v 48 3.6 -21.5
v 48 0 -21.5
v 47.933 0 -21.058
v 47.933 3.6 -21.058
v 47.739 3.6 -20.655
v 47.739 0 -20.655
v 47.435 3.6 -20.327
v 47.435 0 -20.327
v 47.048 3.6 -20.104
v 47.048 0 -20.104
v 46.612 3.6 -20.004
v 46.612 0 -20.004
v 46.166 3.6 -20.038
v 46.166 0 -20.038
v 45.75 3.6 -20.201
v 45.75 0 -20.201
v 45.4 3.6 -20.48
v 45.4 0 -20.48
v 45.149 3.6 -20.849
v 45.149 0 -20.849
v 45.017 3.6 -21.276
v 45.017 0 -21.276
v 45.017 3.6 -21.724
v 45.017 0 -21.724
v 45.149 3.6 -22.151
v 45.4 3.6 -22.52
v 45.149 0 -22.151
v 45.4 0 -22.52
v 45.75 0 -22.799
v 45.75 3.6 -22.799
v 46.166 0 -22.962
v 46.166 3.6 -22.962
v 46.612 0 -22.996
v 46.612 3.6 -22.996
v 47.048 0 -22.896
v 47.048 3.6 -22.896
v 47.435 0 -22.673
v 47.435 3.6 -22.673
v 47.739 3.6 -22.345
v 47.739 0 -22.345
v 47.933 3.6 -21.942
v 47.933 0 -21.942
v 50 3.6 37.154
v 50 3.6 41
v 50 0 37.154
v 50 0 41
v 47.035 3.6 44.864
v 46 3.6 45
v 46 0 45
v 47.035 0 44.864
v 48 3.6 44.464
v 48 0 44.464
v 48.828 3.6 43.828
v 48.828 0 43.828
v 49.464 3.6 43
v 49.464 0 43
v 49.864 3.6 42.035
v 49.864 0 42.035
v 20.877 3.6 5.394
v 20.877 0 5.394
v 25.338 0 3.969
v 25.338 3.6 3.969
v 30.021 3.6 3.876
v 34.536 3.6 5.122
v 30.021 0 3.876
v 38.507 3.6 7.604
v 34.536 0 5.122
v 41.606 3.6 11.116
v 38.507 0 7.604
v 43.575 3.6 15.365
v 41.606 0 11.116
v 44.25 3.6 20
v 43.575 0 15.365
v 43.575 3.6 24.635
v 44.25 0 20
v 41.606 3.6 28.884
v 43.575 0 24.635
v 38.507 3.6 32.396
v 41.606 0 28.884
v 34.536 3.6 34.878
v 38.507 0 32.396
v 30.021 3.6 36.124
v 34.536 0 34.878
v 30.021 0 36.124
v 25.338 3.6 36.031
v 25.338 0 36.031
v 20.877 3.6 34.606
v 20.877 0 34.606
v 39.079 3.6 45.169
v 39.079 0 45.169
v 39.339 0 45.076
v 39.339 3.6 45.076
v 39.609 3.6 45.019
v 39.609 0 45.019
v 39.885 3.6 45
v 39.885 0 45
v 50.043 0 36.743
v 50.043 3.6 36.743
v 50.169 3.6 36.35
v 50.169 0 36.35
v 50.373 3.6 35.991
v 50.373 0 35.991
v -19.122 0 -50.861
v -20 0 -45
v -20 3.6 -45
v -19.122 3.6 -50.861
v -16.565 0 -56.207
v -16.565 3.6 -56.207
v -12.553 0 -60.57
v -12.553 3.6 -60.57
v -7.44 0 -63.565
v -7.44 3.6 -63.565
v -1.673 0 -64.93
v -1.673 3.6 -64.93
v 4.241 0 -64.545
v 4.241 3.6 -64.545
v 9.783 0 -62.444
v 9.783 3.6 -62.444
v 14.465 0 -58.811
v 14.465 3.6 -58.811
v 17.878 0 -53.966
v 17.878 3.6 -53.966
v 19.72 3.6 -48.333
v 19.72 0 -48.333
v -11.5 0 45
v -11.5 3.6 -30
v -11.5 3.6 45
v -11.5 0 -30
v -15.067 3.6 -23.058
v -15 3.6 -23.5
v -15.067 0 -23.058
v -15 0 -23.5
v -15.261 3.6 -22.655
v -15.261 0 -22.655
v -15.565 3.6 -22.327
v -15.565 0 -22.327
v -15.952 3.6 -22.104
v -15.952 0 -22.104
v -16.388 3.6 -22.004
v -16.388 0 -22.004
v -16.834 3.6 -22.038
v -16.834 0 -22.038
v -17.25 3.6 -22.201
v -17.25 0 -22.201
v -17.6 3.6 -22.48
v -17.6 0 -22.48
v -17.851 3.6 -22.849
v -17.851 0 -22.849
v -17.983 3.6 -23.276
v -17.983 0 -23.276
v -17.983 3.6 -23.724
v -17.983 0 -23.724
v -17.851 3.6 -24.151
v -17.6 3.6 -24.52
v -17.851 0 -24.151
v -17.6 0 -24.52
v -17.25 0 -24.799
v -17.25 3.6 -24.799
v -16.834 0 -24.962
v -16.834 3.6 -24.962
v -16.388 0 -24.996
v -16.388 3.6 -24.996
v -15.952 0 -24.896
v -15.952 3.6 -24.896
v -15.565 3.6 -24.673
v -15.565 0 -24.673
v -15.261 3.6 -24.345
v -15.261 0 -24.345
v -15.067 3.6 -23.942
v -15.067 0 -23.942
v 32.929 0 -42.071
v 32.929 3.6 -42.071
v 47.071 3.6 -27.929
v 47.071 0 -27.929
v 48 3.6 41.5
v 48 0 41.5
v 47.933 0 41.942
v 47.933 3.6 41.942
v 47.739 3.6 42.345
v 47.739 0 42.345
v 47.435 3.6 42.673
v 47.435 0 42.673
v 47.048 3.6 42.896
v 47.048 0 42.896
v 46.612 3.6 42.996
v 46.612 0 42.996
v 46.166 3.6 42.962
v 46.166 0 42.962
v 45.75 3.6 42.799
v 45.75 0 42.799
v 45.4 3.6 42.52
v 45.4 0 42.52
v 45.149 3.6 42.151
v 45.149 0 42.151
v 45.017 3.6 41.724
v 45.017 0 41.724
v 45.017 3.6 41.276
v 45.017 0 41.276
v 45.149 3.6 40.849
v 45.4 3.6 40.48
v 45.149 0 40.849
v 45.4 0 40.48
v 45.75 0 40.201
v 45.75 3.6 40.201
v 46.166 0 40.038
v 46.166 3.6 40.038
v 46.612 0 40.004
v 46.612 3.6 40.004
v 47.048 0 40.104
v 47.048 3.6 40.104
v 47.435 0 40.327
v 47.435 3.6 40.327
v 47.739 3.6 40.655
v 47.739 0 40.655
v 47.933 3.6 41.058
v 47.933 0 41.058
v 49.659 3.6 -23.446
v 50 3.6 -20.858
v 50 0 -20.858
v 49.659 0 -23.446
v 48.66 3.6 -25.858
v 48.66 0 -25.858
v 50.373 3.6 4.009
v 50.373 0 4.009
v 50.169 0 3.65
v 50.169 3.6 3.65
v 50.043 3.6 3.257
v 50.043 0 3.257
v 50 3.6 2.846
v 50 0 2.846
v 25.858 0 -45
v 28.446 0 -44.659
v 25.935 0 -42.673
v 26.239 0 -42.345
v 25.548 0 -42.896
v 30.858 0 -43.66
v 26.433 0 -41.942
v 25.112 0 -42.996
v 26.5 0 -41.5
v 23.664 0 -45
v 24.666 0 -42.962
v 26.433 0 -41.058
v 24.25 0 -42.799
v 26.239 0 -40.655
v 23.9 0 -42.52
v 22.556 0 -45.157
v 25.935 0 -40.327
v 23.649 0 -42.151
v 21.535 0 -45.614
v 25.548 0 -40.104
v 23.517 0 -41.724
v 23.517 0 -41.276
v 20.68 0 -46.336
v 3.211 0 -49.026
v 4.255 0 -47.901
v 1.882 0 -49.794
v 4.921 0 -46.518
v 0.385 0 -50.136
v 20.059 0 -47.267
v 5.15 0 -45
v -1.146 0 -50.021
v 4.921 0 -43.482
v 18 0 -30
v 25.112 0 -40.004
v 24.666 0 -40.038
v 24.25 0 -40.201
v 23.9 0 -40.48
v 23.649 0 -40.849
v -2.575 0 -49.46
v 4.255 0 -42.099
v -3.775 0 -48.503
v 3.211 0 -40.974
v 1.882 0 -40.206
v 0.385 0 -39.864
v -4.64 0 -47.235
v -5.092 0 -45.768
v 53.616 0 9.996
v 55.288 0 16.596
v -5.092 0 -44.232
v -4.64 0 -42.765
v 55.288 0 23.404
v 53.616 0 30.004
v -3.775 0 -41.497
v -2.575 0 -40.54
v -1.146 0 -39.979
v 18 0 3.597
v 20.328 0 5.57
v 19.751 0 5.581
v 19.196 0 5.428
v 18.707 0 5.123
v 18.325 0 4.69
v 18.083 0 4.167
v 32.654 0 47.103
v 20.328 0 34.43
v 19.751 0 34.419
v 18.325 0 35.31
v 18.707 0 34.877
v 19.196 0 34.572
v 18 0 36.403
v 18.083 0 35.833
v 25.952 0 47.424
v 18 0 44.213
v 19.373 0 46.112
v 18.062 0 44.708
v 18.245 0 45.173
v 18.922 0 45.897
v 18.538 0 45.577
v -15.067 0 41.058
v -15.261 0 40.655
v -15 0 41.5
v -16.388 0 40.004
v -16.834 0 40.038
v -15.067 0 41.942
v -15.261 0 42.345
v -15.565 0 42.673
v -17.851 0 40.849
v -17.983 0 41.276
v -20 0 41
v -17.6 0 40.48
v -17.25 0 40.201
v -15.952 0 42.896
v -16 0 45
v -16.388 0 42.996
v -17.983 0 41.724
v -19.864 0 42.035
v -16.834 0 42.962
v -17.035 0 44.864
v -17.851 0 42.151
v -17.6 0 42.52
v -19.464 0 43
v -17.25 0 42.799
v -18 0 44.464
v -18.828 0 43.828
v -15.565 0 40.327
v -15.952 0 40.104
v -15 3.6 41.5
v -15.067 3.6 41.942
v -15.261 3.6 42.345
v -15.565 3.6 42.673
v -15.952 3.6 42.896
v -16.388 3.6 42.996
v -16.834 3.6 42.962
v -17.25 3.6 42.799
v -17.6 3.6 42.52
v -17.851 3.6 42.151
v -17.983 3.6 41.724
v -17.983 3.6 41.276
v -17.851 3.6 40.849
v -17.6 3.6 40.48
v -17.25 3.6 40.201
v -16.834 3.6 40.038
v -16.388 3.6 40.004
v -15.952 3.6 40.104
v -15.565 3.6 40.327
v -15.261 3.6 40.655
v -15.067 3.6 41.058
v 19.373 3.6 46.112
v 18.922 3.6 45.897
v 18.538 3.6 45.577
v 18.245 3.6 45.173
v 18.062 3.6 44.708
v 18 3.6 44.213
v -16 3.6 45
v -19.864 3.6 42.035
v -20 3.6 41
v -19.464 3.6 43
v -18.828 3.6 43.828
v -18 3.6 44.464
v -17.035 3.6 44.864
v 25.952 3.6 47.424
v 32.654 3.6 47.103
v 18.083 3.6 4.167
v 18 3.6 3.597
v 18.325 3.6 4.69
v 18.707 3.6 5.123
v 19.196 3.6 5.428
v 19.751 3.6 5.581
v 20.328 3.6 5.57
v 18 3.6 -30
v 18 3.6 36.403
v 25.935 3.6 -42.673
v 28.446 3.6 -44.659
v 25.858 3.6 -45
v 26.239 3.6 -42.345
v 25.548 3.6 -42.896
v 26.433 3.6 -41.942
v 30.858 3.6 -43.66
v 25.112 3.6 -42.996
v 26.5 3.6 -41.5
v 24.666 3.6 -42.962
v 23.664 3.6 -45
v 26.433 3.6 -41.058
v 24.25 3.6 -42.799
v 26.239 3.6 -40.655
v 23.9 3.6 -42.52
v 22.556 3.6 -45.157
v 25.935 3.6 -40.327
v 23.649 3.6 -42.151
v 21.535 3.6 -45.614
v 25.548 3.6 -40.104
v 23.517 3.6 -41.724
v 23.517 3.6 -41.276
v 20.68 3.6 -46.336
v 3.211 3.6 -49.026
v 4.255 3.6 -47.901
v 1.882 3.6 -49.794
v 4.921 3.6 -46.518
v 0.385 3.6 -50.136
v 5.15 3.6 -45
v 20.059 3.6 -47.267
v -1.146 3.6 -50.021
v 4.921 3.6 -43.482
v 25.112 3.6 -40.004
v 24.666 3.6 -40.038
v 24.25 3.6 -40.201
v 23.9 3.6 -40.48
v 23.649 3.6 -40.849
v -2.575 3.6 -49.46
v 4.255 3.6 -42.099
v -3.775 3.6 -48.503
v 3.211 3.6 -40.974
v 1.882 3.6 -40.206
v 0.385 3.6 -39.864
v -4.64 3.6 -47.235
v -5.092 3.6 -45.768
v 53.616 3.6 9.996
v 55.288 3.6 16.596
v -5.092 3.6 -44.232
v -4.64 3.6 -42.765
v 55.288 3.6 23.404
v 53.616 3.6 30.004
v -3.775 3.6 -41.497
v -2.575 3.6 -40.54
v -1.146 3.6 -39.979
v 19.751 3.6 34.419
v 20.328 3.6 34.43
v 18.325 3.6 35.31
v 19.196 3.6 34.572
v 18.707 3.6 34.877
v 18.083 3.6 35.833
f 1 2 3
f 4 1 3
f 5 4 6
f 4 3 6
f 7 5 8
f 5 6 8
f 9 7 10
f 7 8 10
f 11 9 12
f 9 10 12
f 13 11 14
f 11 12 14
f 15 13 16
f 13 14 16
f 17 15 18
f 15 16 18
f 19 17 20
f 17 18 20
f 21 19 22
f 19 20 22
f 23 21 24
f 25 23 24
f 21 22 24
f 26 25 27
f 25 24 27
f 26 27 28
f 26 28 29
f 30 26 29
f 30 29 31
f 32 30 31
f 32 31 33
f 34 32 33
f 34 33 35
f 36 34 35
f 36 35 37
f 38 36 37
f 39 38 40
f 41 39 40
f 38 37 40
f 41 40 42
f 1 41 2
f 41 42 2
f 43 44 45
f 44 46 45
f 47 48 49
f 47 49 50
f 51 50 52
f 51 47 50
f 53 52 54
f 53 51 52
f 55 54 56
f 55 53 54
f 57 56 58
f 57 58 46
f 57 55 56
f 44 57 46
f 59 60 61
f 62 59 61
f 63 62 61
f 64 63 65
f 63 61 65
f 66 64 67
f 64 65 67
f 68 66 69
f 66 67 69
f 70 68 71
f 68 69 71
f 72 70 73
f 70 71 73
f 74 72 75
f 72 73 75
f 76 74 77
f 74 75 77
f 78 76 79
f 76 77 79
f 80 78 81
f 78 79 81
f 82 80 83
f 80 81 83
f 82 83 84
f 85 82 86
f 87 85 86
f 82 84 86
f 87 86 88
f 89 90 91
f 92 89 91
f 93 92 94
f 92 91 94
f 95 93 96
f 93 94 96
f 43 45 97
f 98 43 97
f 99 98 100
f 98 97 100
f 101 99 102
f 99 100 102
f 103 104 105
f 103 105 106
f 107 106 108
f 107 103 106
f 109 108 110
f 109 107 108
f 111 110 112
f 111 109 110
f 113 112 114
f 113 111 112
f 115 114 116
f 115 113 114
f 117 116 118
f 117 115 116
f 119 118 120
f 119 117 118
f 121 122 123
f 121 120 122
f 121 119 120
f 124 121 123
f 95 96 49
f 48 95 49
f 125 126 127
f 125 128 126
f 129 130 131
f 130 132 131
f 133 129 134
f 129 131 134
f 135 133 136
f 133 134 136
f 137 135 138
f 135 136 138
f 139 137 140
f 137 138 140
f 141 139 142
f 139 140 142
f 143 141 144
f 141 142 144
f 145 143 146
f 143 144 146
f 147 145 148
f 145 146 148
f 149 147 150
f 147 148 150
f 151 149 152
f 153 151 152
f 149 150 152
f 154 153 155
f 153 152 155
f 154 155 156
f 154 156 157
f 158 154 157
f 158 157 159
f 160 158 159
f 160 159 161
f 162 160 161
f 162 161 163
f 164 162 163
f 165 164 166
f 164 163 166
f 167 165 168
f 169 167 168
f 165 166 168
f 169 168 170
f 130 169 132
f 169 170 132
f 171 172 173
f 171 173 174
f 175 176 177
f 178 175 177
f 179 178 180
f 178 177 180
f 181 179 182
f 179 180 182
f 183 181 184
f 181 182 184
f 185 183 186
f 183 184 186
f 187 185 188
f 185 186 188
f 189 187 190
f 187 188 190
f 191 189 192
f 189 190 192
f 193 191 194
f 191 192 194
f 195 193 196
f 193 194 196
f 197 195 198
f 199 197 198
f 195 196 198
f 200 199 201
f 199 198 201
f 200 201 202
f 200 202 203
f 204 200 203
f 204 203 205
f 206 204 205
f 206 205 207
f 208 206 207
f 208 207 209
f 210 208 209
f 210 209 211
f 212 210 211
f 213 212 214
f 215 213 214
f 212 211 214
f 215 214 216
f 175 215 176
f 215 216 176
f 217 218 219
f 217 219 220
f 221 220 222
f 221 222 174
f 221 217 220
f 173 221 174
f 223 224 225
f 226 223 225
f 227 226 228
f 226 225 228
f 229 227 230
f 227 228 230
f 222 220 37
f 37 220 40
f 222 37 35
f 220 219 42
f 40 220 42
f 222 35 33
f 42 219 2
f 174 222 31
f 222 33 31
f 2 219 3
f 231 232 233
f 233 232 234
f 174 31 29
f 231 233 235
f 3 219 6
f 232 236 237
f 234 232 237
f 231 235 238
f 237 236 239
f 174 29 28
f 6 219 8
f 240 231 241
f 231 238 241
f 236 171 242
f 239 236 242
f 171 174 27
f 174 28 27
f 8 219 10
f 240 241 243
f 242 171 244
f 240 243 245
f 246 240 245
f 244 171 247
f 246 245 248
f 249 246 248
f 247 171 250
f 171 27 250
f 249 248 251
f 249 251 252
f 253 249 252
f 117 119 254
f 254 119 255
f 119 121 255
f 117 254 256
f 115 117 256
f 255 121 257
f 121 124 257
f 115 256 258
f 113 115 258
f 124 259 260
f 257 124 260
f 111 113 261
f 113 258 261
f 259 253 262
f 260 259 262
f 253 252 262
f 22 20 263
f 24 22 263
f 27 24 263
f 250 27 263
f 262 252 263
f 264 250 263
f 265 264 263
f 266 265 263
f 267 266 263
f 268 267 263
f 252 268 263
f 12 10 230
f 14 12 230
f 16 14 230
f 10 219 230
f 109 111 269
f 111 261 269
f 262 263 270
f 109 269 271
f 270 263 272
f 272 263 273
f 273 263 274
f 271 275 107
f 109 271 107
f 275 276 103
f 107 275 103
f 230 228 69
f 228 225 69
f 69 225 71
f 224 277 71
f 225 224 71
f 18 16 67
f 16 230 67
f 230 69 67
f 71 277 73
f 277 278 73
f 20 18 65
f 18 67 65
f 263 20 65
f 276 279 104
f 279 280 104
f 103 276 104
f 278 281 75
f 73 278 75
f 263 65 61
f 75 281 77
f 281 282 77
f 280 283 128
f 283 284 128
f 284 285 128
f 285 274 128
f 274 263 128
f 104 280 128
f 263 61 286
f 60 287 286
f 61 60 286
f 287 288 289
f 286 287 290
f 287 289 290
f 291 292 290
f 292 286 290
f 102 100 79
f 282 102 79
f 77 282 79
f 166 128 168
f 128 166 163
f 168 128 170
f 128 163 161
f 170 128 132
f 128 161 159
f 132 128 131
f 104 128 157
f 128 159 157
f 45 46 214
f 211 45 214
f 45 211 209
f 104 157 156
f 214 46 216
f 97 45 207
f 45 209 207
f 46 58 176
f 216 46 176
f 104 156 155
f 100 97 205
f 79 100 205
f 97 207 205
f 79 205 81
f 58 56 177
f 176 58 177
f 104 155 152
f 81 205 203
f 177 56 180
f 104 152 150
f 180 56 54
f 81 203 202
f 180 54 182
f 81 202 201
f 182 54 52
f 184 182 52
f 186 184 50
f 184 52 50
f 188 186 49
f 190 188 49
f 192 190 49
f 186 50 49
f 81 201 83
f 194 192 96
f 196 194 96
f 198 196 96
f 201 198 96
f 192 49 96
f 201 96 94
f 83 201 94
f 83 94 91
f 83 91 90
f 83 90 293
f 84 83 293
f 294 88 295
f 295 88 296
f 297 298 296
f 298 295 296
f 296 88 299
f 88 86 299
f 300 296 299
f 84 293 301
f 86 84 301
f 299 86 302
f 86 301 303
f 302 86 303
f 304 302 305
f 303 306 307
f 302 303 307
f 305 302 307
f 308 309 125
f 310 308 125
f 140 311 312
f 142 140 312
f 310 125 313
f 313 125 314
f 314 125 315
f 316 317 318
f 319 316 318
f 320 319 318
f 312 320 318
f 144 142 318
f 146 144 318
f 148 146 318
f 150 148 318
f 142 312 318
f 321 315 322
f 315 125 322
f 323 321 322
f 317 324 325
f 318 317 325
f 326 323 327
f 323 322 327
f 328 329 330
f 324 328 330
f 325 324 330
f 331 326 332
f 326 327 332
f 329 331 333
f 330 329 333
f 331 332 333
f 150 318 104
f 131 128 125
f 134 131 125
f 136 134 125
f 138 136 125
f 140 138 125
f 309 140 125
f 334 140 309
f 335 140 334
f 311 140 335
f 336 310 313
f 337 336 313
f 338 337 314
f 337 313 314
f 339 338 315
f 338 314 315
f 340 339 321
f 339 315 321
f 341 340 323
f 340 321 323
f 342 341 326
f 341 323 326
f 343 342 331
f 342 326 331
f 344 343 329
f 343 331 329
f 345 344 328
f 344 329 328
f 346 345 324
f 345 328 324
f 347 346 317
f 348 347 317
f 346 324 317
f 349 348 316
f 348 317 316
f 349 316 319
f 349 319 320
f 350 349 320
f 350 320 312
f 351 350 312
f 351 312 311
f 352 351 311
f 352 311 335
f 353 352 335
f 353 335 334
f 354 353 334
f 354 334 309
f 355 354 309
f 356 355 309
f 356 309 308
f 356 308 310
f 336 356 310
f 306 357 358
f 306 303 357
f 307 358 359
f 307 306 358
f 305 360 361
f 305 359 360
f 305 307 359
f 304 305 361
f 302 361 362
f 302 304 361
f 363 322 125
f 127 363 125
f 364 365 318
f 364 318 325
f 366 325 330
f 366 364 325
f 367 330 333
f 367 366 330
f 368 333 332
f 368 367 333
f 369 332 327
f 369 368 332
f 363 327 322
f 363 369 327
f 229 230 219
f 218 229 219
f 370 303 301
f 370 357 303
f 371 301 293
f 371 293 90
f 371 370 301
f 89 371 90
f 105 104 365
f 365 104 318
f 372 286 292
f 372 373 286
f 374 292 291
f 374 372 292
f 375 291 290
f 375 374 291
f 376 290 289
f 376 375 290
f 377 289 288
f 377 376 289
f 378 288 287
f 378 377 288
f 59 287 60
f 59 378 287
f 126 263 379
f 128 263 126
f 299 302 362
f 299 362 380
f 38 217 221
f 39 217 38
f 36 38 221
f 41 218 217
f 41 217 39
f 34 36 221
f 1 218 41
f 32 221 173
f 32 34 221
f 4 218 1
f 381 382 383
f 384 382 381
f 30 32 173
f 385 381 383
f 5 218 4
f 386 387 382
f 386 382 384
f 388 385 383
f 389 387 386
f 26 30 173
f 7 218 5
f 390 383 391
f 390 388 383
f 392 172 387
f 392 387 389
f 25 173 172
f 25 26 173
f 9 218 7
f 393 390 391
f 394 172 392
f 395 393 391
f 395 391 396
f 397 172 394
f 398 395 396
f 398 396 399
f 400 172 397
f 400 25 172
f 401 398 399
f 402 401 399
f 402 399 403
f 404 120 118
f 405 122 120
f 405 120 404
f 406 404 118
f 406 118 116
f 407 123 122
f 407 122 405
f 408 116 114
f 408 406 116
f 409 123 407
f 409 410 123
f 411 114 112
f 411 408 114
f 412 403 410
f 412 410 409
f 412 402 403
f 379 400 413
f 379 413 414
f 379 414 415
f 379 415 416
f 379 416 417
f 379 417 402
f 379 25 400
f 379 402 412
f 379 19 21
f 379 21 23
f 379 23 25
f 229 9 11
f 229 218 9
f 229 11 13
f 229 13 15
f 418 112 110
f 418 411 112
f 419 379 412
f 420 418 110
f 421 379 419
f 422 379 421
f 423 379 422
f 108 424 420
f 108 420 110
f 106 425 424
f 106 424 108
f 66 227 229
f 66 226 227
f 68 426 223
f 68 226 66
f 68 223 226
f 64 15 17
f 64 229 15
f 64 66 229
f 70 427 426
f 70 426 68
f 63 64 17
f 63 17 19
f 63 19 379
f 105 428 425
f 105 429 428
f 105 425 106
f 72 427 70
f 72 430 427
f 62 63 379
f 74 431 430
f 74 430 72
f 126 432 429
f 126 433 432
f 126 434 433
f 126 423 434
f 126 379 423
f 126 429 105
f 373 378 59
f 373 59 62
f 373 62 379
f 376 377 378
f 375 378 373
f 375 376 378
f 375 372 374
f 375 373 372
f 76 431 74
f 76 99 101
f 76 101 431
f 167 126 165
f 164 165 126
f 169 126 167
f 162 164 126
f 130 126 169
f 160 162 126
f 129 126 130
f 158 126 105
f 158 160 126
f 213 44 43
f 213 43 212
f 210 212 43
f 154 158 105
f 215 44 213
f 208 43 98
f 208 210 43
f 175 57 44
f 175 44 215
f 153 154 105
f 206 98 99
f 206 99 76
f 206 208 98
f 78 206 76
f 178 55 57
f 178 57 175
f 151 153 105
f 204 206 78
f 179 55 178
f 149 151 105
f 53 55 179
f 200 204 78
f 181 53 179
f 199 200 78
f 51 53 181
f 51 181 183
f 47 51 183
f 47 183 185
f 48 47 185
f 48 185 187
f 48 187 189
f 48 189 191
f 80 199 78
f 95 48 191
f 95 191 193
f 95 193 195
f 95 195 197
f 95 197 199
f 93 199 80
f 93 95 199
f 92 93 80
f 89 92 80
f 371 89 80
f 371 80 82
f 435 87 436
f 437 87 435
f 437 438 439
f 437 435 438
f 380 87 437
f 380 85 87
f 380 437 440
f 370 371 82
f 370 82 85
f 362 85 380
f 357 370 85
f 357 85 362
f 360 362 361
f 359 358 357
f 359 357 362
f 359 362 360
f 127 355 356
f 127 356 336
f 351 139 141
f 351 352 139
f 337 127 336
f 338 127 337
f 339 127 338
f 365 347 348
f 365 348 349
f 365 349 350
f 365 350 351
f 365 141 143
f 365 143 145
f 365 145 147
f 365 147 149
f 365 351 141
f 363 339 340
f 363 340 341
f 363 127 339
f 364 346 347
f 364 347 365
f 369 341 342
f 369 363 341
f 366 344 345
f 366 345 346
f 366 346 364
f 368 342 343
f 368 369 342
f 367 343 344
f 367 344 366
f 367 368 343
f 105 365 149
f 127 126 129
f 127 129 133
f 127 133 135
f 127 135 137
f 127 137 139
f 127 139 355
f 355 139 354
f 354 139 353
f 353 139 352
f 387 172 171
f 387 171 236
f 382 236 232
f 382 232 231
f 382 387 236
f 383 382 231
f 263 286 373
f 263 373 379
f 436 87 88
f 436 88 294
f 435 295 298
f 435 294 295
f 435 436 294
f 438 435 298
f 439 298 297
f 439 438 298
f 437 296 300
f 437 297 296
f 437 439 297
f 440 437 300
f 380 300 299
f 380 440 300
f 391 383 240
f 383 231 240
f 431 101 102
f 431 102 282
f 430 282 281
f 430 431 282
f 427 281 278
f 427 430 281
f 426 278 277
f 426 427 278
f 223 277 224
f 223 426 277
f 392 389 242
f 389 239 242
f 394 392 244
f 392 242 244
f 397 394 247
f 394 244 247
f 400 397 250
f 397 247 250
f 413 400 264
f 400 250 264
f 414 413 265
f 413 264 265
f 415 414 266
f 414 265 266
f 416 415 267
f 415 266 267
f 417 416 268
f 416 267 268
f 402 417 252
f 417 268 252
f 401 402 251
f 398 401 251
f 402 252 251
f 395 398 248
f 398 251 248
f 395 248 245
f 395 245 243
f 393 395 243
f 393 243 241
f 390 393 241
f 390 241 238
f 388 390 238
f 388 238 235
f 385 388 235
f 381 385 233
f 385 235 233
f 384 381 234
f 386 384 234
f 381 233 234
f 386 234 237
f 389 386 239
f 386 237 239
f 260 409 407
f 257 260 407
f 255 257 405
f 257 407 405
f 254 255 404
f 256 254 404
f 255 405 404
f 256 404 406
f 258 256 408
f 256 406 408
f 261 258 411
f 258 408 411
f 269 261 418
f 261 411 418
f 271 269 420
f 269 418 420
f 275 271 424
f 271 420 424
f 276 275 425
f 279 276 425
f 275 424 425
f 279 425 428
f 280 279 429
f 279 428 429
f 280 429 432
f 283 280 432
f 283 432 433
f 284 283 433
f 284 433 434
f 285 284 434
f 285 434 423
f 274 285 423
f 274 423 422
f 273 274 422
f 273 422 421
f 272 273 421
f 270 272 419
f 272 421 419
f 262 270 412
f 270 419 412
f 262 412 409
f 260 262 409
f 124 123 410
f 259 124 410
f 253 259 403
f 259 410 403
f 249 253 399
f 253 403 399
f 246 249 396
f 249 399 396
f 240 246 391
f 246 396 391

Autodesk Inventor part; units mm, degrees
ref_plane "YZ Plane" through (0, 0, 0) normal (1, 0, 0) x (0, 1, 0)
ref_plane "XZ Plane" through (0, 0, 0) normal (0, 1, 0) x (-1, 0, 0)
ref_plane "XY Plane" through (0, 0, 0) normal (0, 0, 1) x (1, 0, 0)
sketch "Sketch1" plane through (0, 0, 0) normal (0, 1, 0) x (-1, 0, 0)
  line L0 (20, 45) -> (-20, 45)
  line L1 (-20, 45) -> (-20, -45)
  line L2 (-20, -45) -> (20, -45)
  line L3 (20, -45) -> (20, 45)
  line L4 (20, 45) -> (-20, -45) construction
  line L5 (-20, 45) -> (20, -45) construction
  arc A0 (-20, -45) -> (20, -45) centre (0, -45) ccw
  line L6 (20, -45) -> (20, -45)
  line L7 (20, -45) -> (20, 45)
  line L8 (20, 45) -> (20, 45)
  line L9 (20, 45) -> (20, -45)
  line L10 (-20, 45) -> (-50, 45)
  line L11 (-50, 45) -> (-50, -45)
  line L12 (-50, -45) -> (-20, -45)
  line L13 (-20, -45) -> (-20, 45)
  point P0 (0, 0)
  dimension "d0" = 40
  dimension "d1" = 90
  dimension "d7" = 0
  dimension "d8" = 90
  dimension "d35" = 30
extrude "Extrusion1" add sketch "Sketch1" along normal blind 3.6
sketch "Sketch2" plane through (0, 3.6, 0) normal (0, 1, 0) x (1, 0, 0)
  arc A0 (20, 45) -> (-20, 45) centre (0, 45) ccw projected
  circle A1 centre (0, 45) radius 5.15
  point P0 (0, 0)
  dimension "d4" = 10.3
extrude "Extrusion2" cut sketch "Sketch2" against normal blind 3.6
sketch "Sketch3" plane through (0, 0, 0) normal (0, -1, 0) x (1, 0, 0)
  line L0 (-20, 45) -> (50, 45) projected
  line L1 (-11.5, 45) -> (18, 45)
  line L2 (18, 45) -> (18, -30)
  line L3 (18, -30) -> (-11.5, -30)
  line L4 (-11.5, -30) -> (-11.5, 45)
  circle A0 centre (28, 20) radius 16.25
  line L5 (-20, -45) -> (-20, 45) projected
  line L6 (50, 45) -> (50, -45) projected
  point P0 (0, 0)
  point P1 (16, 45)
  dimension "d10" = 29.5
  dimension "d11" = 75
  dimension "d13" = 32.5
  dimension "d15" = 25
  dimension "d37" = 32
  dimension "d39" = 22
extrude "Extrusion3" cut sketch "Sketch3" against normal blind 10
fillet "Fillet2" radius 2 3 edges at (18, 1.8, 45) (18, 1.8, 32.8087) (18, 1.8, 7.1913)
fillet "Fillet3" radius 4 4 edges at (50, 1.8, 45) (-20, 1.8, 45) (20, 1.8, -45) (-20, 1.8, -45)
chamfer "Chamfer1" distance 20 angle 45 1 edges at (50, 1.8, -45)
fillet "Fillet4" radius 10 2 edges at (30, 1.8, -45) (50, 1.8, -25)
sketch "Sketch6" plane through (3.0674, 0, -14.7029) normal (0, -1, 0) x (1, 0, 0)
  circle A0 centre (21.9326, -26.7971) radius 1.5
  circle A1 centre (43.4326, -6.7971) radius 1.5
  circle A2 centre (43.4326, 56.2029) radius 1.5
  line L0 (25.8579, -30.2971) -> (23.6643, -30.2971)
  line L1 (46.9326, 55.7029) -> (46.9326, -5.2971)
  line L2 (-23.0674, -30.2971) -> (-23.0674, 55.7029)
  line L3 (-16, 59.7029) -> (42.9326, 59.7029)
  circle A3 centre (18.4326, 43) radius 1.75
  line L4 (-23.0674, -30.2971) -> (-23.0674, 55.7029) projected
  line L5 (16.9326, 59.7029) -> (42.9326, 59.7029) projected
  line L6 (46.9326, 55.7029) -> (46.9326, -6.155) projected
  line L7 (22.7905, -30.2971) -> (20.5969, -30.2971) projected
  point P0 (0, 0)
  dimension "d56" = 3
  dimension "d53" = 3
  dimension "d50" = 3
  dimension "d58" = 3.5
  dimension "d55" = 3.5
  dimension "d57" = 25
  dimension "d54" = 20
  dimension "d52" = 3.5
  dimension "d51" = 3.5
  dimension "d45" = 3.5
  dimension "d46" = 25
  dimension "d62" = 0
  dimension "d63" = 0
  dimension "d64" = 0
  dimension "d65" = 0
  dimension "d66" = 0
  dimension "d67" = 0
  dimension "d68" = 25
  dimension "d69" = 0
  dimension "d70" = 0
extrude "Extrusion6" cut sketch "Sketch6" against normal blind 10
sketch "Sketch7" plane through (33.0492, 0, -22.6689) normal (0, -1, 0) x (1, 0, 0)
  circle A0 centre (-49.5492, 64.1689) radius 1.5
  circle A1 centre (-49.5492, -0.8311) radius 1.5
  line L0 (-49.0492, 67.6689) -> (12.9508, 67.6689)
  line L1 (-53.0492, -23.8754) -> (-53.0492, 41)
  arc A2 (-53.0492, -23.8754) -> (-46.6341, -27.064) centre (-49.0492, -23.8754) ccw
  line L2 (-53.0492, -22.3311) -> (-53.0492, 63.6689) projected
  line L3 (-49.0492, 67.6689) -> (-44.5492, 67.6689) projected
  point P0 (0, 0)
  dimension "d74" = 3
  dimension "d71" = 3
  dimension "d76" = 3.5
  dimension "d75" = 3.5
  dimension "d73" = 3.5
  dimension "d72" = 65
  dimension "d80" = 0
  dimension "d81" = 0
extrude "Extrusion7" cut sketch "Sketch7" against normal blind 10
sketch "Sketch8" plane through (0, 0, 0) normal (0, -1, 0) x (1, 0, 0)
  point P0 (0, 0)
sketch "Sketch9" plane through (0, 3.6, 0) normal (0, 1, 0) x (1, 0, 0)
  line L0 (20, -45) -> (46, -45) projected
  line L1 (50, -41) -> (50, 20.8579) projected
  line L2 (18, -43) -> (18, -45.6174)
  arc A0 (18, -43) -> (20, -45) centre (20, -43) ccw projected
  arc A1 (18, -45.6174) -> (39.4564, -45) centre (28, -20) ccw
  arc A2 (50, -36.5) -> (50, -3.5) centre (28, -20) ccw
  point P0 (0, 0)
  dimension "d82" = 25
  dimension "d83" = 22
extrude "Extrusion8" add sketch "Sketch9" against normal blind 3.6
fillet "Fillet5" radius 2 4 edges at (18, 1.8, 45.6174) (50, 1.8, 36.5) (50, 1.8, 3.5) (39.4564, 1.8, 45)
properties part number "p1"
